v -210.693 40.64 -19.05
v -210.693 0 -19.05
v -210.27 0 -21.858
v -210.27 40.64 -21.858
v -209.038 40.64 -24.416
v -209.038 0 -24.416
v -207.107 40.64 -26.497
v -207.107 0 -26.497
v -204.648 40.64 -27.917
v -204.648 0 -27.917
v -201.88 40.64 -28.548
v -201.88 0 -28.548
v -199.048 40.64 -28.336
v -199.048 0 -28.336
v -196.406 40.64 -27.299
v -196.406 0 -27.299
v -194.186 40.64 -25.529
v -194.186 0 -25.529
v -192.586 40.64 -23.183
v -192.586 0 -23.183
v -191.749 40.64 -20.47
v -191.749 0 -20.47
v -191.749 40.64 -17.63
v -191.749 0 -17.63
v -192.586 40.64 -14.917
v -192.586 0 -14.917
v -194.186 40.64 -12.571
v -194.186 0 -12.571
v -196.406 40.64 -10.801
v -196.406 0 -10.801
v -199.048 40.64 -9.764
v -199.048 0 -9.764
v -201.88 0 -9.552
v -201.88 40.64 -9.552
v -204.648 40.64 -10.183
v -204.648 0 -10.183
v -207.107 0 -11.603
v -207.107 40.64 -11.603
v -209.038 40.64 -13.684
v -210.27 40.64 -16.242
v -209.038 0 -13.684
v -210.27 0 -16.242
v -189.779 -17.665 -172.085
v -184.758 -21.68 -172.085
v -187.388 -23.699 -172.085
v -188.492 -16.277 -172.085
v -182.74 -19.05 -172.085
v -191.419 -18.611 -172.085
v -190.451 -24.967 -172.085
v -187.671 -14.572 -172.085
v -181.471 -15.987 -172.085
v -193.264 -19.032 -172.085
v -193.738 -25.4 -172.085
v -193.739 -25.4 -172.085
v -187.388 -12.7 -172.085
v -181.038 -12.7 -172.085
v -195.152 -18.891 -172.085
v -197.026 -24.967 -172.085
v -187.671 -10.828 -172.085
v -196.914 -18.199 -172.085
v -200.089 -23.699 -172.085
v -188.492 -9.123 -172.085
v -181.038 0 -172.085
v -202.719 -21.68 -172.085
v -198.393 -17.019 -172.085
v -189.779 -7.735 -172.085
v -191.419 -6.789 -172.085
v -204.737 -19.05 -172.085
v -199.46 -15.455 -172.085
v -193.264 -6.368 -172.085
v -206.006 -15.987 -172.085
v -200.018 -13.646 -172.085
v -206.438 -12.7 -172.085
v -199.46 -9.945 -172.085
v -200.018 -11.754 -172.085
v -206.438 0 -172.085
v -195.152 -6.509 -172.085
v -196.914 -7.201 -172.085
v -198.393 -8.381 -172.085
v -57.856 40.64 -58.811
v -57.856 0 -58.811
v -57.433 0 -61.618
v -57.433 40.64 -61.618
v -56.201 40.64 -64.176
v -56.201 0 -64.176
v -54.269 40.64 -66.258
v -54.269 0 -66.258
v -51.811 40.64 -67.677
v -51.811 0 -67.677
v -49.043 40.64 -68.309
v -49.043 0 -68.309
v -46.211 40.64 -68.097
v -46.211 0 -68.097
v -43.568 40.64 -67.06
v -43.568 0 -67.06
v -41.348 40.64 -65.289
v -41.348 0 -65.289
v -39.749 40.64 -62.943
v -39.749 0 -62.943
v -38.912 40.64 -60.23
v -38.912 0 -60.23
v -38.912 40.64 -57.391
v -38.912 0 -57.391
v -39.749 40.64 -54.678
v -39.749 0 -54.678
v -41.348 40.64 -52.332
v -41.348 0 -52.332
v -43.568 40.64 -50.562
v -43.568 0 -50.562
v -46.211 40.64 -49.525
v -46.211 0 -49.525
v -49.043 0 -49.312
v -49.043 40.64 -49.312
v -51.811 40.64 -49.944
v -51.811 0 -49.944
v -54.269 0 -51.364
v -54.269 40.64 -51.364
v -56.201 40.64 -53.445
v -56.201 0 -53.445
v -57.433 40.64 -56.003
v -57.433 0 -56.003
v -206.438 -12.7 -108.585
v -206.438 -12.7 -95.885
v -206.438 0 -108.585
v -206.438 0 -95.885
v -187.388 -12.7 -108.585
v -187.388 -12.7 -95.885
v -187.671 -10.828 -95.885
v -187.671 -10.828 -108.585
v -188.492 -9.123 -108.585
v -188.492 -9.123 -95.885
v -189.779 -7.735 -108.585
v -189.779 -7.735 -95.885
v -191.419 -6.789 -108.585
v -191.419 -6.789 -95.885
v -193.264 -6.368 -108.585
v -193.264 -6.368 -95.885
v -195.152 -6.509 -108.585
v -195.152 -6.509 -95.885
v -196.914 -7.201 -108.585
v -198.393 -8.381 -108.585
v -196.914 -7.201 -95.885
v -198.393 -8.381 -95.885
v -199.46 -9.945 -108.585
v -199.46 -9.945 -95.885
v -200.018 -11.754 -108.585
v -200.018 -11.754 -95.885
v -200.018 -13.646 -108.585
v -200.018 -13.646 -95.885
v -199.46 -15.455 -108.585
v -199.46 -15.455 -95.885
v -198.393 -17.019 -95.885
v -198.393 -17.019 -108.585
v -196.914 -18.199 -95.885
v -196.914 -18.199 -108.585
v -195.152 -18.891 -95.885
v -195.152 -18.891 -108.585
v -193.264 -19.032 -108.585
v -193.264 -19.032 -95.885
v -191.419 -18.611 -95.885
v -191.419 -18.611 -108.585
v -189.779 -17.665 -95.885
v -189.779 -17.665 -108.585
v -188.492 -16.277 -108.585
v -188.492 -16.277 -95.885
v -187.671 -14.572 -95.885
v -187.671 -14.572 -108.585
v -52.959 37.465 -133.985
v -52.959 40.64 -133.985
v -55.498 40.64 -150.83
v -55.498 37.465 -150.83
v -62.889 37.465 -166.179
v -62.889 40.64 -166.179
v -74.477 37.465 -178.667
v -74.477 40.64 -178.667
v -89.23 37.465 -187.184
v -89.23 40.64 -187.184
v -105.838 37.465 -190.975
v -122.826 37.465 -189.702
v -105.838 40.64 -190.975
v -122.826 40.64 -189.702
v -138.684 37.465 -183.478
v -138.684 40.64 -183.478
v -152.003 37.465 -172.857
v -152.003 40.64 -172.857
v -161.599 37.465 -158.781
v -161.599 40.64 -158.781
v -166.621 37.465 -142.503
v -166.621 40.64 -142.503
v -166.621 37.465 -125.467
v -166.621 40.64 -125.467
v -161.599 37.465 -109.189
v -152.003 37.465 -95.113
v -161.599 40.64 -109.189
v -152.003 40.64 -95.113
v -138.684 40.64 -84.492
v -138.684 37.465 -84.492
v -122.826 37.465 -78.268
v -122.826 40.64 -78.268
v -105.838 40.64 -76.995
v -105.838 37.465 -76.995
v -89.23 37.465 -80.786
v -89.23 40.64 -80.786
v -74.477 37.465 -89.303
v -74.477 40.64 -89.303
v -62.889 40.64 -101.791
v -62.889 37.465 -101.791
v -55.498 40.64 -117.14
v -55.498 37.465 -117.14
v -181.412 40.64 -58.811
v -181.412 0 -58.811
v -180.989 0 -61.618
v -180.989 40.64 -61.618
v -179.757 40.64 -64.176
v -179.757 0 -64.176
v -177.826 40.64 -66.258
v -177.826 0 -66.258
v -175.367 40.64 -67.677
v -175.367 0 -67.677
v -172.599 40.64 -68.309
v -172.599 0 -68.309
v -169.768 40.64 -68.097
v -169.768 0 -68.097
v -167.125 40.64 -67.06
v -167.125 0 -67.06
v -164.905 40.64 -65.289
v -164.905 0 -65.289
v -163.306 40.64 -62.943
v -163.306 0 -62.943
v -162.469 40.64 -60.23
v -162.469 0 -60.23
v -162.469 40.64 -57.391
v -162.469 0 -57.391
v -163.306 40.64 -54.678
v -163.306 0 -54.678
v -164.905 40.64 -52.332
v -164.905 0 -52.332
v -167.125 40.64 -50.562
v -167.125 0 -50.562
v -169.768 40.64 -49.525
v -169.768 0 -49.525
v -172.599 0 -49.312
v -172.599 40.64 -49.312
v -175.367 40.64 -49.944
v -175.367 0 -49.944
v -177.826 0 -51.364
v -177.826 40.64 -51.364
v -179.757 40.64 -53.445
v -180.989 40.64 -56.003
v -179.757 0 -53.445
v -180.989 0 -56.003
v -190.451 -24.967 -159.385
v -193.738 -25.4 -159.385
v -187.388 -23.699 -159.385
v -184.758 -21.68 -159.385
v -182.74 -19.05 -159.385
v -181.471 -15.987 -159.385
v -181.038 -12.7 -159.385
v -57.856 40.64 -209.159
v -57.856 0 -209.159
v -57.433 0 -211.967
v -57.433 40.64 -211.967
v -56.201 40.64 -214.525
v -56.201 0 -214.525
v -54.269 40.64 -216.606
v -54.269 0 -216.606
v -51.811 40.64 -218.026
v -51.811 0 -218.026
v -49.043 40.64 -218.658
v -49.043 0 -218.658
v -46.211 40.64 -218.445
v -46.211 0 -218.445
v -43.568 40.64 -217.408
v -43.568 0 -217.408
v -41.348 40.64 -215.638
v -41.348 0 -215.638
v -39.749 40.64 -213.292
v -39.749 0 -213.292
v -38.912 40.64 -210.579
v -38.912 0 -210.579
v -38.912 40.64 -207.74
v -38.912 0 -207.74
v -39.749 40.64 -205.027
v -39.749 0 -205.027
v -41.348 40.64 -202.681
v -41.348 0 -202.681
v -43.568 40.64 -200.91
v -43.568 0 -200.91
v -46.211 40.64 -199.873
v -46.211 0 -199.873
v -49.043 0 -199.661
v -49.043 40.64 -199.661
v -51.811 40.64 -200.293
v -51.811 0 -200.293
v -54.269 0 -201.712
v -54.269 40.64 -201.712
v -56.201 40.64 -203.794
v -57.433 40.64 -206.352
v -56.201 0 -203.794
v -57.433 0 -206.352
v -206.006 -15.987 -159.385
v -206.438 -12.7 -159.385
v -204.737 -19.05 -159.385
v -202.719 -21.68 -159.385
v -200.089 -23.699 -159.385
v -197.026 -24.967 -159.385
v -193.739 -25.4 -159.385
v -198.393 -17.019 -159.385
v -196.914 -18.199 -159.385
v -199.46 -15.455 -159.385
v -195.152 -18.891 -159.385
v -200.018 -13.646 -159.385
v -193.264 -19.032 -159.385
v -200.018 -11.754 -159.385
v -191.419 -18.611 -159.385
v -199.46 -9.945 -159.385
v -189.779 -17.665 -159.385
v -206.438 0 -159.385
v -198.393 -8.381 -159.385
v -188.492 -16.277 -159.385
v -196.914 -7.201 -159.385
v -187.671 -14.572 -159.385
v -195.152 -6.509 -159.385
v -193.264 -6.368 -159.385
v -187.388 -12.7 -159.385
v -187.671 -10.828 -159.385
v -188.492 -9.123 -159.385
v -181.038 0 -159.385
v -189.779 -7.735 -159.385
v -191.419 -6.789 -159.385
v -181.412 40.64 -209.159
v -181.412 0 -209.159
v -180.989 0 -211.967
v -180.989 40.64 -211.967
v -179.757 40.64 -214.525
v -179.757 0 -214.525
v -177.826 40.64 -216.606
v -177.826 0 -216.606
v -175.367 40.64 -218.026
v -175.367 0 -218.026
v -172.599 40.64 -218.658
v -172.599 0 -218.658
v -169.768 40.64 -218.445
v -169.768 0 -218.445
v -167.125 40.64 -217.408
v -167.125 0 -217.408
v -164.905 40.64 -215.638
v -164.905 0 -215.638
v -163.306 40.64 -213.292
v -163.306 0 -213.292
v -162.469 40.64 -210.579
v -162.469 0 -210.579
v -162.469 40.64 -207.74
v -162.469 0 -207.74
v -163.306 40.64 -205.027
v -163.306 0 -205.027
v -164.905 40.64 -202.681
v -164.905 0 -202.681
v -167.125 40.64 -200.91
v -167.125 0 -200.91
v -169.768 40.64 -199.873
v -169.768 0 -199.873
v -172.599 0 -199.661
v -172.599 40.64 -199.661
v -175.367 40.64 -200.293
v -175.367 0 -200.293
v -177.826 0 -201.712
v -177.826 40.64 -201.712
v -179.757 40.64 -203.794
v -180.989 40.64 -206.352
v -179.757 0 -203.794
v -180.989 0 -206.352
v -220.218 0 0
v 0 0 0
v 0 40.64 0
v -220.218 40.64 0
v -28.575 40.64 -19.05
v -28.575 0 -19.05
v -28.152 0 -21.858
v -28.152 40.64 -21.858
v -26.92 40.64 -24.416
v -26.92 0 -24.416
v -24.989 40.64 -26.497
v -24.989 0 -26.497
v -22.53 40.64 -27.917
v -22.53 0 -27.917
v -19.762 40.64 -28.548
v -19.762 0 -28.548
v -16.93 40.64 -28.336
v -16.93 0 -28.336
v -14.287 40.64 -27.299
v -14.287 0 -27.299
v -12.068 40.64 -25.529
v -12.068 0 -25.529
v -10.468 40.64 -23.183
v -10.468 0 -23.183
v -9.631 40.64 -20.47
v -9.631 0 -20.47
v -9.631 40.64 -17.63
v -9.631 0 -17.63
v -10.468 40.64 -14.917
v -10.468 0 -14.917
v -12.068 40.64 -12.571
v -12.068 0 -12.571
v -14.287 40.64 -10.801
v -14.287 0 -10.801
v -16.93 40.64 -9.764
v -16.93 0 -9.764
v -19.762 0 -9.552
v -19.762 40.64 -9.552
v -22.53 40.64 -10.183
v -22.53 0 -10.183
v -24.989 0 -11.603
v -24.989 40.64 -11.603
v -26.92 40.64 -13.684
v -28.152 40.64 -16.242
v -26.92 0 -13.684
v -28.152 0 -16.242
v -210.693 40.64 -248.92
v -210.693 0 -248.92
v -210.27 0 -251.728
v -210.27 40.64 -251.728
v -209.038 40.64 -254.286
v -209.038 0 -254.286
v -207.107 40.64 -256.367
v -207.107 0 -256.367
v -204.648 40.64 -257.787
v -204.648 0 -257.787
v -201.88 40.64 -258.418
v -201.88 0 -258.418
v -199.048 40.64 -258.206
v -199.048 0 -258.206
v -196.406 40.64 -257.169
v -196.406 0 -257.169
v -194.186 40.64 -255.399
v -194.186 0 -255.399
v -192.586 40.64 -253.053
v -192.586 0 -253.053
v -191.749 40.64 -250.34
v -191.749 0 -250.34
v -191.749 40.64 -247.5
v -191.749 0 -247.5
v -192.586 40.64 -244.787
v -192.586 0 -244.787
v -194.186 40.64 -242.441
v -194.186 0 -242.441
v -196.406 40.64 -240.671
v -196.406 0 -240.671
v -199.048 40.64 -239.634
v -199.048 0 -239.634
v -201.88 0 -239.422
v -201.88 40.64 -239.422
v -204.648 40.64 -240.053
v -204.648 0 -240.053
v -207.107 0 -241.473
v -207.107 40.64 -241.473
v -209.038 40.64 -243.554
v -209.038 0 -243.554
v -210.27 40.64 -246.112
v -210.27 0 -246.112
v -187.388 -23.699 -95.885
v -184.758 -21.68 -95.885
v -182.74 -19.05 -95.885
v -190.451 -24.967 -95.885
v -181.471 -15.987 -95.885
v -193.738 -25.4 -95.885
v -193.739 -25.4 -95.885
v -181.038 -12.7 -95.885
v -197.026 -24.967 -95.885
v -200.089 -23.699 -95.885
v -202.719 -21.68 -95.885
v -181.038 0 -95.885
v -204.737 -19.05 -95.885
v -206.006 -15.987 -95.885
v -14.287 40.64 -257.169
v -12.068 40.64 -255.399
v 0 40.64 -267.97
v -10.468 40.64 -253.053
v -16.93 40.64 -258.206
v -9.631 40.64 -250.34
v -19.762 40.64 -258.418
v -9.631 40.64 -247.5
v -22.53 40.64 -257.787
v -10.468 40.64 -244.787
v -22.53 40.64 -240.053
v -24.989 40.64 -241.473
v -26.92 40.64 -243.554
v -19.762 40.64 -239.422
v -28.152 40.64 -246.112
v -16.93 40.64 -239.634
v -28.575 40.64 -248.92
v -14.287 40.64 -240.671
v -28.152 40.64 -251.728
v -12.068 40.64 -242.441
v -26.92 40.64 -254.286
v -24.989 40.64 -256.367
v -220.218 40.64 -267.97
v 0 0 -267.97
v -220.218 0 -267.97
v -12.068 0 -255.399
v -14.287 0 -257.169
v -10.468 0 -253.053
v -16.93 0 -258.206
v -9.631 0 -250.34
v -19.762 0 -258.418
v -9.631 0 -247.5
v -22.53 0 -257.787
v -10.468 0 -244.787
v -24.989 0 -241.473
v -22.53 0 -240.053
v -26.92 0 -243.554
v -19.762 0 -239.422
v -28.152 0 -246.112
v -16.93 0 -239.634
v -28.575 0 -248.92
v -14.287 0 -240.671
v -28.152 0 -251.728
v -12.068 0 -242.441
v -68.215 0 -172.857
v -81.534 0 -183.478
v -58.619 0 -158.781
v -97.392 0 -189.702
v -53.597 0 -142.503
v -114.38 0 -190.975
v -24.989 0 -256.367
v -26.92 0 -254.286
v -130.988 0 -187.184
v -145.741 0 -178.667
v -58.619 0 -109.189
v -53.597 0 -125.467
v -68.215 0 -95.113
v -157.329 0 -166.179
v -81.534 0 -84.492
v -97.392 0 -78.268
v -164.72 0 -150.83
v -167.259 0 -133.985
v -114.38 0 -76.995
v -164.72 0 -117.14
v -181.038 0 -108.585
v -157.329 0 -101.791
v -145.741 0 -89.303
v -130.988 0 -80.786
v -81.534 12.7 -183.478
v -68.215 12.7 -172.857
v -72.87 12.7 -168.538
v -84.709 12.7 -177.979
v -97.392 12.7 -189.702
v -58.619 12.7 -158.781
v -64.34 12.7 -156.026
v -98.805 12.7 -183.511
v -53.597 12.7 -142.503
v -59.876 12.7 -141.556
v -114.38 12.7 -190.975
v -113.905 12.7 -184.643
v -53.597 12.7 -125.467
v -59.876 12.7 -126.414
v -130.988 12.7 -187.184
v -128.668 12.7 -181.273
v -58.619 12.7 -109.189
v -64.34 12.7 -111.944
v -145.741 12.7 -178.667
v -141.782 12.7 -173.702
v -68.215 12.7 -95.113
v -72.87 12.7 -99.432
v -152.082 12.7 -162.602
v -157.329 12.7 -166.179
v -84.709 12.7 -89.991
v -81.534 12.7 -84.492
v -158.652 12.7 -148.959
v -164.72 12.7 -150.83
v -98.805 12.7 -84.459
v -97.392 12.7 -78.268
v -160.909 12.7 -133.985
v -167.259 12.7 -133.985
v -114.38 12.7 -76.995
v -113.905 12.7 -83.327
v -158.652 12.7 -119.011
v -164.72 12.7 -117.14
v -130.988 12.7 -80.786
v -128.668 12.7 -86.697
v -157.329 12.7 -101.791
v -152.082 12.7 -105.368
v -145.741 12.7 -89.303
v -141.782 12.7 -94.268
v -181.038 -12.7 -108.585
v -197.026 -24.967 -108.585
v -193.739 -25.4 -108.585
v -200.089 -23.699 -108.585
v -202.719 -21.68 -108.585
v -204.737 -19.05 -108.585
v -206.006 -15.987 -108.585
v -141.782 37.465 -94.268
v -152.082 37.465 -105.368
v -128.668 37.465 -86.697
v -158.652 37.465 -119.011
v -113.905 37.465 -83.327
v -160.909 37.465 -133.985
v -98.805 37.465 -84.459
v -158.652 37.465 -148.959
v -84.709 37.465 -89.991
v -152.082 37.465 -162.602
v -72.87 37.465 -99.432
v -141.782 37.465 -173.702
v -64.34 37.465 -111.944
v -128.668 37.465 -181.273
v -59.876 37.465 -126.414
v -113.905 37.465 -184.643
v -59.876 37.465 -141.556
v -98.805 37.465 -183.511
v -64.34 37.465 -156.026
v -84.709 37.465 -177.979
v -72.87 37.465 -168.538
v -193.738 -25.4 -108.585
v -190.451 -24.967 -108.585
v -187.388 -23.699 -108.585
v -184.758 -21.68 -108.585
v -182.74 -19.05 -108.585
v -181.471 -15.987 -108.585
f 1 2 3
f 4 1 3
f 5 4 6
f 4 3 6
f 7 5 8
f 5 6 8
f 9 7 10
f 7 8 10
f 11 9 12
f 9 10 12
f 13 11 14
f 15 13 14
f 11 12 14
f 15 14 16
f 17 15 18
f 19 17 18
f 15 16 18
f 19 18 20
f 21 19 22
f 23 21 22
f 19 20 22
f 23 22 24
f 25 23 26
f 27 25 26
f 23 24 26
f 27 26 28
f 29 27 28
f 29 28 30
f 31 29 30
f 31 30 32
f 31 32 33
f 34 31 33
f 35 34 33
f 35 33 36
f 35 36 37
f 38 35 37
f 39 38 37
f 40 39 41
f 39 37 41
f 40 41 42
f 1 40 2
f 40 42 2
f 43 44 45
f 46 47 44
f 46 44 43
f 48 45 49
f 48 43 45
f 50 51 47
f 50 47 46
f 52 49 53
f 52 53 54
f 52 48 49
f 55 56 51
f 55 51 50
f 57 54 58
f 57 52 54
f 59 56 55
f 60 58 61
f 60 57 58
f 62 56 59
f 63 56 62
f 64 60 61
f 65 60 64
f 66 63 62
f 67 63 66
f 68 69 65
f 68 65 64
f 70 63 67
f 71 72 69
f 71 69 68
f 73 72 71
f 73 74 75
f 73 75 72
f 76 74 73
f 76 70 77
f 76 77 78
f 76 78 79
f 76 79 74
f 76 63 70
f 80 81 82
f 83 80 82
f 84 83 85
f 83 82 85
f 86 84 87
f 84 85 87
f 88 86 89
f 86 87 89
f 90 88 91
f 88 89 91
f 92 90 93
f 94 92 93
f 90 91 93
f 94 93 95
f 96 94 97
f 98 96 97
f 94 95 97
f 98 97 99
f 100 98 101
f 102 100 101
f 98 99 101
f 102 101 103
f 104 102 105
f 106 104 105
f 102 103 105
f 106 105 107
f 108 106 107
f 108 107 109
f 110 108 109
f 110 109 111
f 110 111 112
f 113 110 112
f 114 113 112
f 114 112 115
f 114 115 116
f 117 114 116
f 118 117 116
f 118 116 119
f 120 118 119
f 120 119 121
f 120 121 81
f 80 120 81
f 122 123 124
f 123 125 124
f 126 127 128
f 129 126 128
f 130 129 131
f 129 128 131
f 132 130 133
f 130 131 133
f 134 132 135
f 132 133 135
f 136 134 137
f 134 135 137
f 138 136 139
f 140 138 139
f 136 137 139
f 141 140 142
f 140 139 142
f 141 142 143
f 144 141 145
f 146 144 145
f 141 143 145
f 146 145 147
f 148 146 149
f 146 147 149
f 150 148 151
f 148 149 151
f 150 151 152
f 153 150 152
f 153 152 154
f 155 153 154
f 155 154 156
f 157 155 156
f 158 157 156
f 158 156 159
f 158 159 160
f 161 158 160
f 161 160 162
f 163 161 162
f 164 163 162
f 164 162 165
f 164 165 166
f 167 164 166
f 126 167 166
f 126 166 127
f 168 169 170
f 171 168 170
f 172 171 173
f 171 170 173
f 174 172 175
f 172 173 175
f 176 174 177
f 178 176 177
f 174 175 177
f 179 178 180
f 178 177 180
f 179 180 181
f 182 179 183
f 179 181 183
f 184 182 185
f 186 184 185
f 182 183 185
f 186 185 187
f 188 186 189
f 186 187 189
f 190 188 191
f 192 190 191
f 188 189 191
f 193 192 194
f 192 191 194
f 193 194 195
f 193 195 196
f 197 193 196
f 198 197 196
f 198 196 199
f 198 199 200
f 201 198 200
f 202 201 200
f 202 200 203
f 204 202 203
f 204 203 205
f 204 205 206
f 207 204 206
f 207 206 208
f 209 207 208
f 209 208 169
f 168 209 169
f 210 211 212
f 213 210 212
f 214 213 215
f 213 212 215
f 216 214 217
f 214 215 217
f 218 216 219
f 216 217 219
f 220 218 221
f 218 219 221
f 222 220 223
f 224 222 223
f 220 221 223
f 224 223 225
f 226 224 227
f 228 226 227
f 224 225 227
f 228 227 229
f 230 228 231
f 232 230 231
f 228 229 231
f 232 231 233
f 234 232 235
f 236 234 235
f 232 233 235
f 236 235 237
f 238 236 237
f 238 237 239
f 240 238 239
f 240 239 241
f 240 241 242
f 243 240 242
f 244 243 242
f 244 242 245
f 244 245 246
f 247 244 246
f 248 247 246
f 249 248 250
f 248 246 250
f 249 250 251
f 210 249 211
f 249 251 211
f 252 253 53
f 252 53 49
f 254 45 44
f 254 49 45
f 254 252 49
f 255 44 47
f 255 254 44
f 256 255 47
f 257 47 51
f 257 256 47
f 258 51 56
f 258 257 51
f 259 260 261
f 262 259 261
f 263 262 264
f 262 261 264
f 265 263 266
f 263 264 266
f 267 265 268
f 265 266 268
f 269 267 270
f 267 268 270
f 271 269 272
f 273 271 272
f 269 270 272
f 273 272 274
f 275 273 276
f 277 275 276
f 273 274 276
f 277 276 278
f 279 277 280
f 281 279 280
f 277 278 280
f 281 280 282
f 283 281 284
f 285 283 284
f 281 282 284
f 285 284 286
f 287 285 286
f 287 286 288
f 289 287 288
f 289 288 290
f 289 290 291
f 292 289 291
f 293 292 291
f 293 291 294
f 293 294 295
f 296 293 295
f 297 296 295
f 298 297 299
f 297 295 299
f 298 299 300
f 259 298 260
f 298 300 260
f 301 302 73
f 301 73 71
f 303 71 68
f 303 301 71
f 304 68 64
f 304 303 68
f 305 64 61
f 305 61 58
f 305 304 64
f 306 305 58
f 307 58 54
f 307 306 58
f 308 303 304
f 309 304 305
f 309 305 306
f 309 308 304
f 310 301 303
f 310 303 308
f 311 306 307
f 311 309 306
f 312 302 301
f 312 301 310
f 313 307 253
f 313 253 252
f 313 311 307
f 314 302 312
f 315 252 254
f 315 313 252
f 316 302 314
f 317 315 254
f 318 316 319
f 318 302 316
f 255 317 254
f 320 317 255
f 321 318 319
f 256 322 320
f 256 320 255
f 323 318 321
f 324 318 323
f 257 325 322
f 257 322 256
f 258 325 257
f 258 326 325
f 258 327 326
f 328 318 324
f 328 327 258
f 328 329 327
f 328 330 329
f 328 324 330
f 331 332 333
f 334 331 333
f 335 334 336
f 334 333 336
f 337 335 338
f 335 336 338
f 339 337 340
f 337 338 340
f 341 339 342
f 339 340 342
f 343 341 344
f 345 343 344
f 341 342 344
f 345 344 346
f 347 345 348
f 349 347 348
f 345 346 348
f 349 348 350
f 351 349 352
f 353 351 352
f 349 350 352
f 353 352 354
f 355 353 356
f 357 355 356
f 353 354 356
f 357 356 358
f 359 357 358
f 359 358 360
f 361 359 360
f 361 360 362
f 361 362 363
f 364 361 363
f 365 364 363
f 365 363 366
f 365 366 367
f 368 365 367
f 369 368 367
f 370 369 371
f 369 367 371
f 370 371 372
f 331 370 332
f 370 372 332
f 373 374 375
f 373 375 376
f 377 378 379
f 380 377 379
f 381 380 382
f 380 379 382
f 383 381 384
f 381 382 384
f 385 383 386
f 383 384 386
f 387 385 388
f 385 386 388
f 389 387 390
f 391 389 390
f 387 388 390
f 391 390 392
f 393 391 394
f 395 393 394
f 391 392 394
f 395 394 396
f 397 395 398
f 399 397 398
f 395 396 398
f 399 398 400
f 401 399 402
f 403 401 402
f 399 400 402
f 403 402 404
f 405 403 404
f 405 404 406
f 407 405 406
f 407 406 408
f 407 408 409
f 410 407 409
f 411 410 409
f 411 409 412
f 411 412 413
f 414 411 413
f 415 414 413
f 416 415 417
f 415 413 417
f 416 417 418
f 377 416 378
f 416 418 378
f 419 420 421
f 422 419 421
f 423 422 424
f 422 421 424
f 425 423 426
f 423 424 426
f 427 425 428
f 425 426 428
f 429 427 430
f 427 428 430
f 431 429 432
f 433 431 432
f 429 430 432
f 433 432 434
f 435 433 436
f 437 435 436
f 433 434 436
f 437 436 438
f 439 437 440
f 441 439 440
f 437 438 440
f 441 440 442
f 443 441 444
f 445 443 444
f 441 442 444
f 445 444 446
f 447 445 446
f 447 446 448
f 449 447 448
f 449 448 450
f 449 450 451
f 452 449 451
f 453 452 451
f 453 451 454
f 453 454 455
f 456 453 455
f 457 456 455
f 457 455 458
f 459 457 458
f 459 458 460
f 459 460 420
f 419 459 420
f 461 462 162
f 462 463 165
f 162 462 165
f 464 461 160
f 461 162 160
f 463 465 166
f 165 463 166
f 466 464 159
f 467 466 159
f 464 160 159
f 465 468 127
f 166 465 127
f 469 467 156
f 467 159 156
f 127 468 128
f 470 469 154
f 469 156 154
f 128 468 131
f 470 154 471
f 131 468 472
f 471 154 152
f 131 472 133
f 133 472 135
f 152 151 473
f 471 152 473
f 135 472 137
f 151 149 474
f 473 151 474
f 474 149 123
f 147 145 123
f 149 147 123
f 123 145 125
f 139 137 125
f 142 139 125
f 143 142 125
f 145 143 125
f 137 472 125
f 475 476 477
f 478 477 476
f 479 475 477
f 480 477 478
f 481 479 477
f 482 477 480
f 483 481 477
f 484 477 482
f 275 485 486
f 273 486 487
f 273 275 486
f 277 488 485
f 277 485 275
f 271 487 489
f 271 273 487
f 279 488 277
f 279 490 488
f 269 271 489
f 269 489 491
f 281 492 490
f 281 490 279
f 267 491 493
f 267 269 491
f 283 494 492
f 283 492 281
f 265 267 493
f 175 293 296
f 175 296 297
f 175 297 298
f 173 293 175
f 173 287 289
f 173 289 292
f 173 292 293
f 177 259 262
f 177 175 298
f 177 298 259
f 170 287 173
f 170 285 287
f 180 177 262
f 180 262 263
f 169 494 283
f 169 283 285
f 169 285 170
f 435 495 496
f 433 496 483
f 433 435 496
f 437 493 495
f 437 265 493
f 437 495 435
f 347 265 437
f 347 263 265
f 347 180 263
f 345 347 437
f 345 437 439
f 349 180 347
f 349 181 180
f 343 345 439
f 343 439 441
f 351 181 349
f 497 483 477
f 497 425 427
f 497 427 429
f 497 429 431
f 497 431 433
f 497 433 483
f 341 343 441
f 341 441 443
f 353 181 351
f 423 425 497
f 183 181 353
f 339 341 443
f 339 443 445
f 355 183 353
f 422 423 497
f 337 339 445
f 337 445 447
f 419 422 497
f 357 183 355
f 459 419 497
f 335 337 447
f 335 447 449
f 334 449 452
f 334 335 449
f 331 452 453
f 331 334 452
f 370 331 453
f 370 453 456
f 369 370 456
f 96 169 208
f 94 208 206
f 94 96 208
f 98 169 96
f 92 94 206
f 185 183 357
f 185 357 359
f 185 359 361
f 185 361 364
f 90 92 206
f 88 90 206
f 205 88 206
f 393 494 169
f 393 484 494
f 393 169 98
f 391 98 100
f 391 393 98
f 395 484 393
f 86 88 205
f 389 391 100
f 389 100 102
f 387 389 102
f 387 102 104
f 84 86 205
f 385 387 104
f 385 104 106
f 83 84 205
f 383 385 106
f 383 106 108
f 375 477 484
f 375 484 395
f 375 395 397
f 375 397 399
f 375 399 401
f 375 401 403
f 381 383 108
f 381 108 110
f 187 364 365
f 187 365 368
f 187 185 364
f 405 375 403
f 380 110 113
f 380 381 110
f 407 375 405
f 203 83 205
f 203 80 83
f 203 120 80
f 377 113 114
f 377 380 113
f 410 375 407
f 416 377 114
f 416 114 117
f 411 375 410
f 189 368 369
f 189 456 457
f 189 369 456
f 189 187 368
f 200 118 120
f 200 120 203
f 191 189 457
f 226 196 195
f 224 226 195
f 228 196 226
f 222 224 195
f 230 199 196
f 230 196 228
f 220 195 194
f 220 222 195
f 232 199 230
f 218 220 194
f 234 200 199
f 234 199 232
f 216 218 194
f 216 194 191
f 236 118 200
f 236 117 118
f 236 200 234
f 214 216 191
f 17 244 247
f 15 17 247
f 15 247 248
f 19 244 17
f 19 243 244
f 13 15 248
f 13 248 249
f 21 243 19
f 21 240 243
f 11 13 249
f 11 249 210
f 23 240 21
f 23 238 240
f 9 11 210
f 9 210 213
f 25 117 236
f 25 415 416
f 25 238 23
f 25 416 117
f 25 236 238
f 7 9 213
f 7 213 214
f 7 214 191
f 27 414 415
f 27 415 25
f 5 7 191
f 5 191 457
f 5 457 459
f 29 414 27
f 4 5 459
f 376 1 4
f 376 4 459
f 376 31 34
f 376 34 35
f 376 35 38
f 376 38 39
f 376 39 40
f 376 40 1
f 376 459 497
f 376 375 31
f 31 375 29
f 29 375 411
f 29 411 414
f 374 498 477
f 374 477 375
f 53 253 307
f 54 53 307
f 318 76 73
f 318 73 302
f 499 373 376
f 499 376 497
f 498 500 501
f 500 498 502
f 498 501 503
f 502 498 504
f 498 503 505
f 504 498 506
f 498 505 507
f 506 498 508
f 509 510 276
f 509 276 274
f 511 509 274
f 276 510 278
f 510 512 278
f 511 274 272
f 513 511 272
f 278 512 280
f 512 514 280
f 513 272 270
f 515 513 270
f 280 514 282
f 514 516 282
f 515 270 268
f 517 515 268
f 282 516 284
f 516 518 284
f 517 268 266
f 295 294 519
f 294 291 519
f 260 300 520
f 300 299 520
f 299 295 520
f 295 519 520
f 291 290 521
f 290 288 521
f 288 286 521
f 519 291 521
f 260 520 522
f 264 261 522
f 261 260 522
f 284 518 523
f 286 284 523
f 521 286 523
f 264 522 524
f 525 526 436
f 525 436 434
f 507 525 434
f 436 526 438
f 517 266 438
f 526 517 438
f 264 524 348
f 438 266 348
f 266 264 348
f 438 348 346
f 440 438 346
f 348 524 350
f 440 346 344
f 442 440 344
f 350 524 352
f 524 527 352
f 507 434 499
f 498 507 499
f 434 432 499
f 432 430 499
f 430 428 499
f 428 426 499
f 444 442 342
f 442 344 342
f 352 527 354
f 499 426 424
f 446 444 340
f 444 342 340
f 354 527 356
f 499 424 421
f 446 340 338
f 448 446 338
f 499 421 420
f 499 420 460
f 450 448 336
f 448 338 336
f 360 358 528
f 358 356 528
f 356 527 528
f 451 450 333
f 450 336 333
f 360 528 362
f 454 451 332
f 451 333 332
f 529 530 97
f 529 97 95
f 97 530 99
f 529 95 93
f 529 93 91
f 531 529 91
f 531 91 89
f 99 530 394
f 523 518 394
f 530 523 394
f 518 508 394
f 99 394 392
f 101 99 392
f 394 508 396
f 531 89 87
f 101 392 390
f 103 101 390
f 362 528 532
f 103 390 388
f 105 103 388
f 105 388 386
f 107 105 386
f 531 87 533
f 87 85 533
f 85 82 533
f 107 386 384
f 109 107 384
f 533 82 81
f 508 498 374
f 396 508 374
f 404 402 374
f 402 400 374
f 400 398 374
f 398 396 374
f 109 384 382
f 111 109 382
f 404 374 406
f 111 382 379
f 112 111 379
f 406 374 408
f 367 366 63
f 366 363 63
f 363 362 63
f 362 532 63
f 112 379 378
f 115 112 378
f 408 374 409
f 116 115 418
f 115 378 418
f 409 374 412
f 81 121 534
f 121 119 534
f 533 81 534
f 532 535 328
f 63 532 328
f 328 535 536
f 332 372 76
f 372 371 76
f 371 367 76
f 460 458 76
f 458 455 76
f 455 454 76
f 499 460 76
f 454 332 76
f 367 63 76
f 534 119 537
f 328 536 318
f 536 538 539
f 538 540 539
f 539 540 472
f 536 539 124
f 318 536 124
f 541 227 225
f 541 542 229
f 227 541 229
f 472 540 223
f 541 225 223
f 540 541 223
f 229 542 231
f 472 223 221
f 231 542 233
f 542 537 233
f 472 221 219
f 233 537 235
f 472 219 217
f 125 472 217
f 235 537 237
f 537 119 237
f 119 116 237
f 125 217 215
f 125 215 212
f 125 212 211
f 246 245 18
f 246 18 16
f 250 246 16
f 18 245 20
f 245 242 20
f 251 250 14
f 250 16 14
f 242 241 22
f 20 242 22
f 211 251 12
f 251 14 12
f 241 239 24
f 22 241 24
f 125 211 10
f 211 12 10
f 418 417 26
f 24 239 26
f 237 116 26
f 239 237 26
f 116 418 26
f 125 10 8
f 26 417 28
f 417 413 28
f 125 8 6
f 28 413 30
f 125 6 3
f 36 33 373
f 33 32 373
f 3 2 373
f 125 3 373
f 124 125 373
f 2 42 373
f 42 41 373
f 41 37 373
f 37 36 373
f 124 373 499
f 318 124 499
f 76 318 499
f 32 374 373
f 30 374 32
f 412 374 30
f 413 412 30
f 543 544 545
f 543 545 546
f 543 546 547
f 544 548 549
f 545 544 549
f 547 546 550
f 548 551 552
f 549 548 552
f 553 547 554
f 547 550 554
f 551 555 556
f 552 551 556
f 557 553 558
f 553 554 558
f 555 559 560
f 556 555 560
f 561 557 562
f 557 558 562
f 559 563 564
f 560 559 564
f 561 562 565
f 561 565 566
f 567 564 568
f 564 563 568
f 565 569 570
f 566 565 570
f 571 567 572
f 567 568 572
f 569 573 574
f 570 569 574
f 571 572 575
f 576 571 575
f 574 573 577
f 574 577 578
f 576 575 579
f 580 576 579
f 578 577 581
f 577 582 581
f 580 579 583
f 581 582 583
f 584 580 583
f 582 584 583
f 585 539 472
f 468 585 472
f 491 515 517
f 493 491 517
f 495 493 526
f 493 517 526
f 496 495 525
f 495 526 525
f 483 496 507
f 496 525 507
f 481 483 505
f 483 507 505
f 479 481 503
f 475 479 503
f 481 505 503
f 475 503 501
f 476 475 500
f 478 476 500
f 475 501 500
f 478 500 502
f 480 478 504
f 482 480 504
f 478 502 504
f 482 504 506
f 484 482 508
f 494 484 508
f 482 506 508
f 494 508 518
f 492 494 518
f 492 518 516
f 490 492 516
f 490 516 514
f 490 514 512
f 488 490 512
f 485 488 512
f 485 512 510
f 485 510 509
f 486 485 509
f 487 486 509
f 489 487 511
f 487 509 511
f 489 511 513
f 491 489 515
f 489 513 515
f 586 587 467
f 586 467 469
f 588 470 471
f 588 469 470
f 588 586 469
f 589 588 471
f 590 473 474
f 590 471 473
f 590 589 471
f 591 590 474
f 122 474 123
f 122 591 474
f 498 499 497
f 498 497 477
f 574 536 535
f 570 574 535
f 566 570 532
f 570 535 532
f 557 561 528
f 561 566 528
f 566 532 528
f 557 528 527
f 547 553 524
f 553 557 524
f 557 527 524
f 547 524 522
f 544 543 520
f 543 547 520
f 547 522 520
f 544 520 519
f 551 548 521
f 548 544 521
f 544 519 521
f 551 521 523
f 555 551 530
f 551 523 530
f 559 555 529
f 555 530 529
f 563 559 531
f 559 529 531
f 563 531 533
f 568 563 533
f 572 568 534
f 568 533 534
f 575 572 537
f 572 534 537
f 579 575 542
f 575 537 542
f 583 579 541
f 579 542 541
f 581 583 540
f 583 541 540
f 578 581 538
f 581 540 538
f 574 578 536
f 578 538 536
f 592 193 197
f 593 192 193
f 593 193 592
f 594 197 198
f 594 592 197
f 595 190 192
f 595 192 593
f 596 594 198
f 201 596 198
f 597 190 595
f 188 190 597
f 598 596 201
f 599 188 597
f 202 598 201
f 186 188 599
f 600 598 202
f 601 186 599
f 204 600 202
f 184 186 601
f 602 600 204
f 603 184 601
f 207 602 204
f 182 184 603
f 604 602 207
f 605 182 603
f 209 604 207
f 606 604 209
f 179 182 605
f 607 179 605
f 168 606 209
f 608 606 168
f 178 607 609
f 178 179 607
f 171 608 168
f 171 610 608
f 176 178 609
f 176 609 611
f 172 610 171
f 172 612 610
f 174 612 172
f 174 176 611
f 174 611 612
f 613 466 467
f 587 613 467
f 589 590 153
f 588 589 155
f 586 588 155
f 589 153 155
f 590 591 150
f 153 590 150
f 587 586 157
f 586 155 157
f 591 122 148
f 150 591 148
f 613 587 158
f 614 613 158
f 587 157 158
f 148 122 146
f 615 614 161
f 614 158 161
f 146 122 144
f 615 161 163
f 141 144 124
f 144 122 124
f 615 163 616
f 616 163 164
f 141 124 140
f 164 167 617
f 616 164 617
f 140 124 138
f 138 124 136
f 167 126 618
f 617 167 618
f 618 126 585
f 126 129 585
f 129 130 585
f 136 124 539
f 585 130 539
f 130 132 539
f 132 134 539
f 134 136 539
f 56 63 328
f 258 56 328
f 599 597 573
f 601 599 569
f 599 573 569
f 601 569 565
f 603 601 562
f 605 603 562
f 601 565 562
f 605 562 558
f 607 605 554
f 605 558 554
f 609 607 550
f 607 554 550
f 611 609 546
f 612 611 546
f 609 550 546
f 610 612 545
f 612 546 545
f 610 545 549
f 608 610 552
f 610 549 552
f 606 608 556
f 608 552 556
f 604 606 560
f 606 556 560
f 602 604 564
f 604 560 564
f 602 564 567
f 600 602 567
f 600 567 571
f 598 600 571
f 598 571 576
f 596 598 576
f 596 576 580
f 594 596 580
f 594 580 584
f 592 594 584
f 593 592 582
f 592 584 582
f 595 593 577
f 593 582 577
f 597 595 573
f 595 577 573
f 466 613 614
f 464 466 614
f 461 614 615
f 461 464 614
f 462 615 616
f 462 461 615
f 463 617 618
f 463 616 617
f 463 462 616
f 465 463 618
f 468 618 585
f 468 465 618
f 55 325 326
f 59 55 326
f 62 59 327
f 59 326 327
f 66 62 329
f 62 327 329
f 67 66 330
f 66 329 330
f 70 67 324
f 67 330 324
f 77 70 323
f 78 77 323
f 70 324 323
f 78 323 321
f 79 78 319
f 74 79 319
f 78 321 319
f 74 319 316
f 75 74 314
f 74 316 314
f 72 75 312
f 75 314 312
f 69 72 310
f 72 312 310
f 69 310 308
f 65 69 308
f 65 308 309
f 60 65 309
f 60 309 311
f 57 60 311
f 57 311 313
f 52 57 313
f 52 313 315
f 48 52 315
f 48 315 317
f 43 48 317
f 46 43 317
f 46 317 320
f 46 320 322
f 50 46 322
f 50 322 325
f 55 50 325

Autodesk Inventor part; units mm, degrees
ref_plane "YZ Plane" through (0, 0, 0) normal (1, 0, 0) x (0, 1, 0)
ref_plane "XZ Plane" through (0, 0, 0) normal (0, 1, 0) x (-1, 0, 0)
ref_plane "XY Plane" through (0, 0, 0) normal (0, 0, 1) x (1, 0, 0)
sketch "Sketch1" plane through (0, 0, 0) normal (0, 1, 0) x (-1, 0, 0)
  line L0 (0, 0) -> (220.218, 0)
  line L1 (220.218, 0) -> (220.218, -267.97)
  line L2 (220.218, -267.97) -> (0, -267.97)
  line L3 (0, -267.97) -> (0, 0)
  circle A0 centre (110.109, -133.985) radius 57.15
  circle A1 centre (110.109, -133.985) radius 50.8
  line L4 (220.218, 0) -> (220.218, -25.4)
  circle A2 centre (201.168, -248.92) radius 9.525
  circle A3 centre (201.168, -19.05) radius 9.525
  circle A4 centre (19.05, -248.92) radius 9.525
  circle A5 centre (19.05, -19.05) radius 9.525
  line L5 (181.0385, -172.085) -> (193.7385, -172.085)
  line L6 (193.7385, -172.085) -> (206.4385, -172.085)
  line L7 (181.0385, -172.085) -> (206.4385, -172.085)
  line L8 (206.4385, -172.085) -> (206.4385, -159.385)
  line L9 (206.4385, -159.385) -> (181.0385, -159.385)
  line L10 (181.0385, -95.885) -> (193.7385, -95.885)
  line L11 (193.7385, -95.885) -> (206.4385, -95.885)
  line L12 (181.0385, -95.885) -> (206.4385, -95.885)
  line L13 (206.4385, -95.885) -> (206.4385, -108.585)
  line L14 (206.4385, -108.585) -> (181.0385, -108.585)
  line L15 (181.0385, -172.085) -> (181.0385, -159.385)
  line L16 (181.0385, -108.585) -> (181.0385, -95.885)
  circle A6 centre (171.8873, -209.1593) radius 34.925
  circle A7 centre (48.3307, -209.1593) radius 34.925
  circle A8 centre (171.8873, -58.8107) radius 34.925
  circle A9 centre (48.3307, -58.8107) radius 34.925
  circle A10 centre (171.8873, -58.8107) radius 9.525
  circle A11 centre (171.8873, -209.1593) radius 9.525
  circle A12 centre (48.3307, -209.1593) radius 9.525
  circle A13 centre (48.3307, -58.8107) radius 9.525
  dimension "d0" = 220.218
  dimension "d1" = 267.97
  dimension "d41" = 12.7
  dimension "d44" = 12.7
  dimension "d52" = 69.85
  dimension "d53" = 19.05
  dimension "d54" = 19.05
  dimension "d57" = 19.05
  dimension "d58" = 19.05
extrude "Extrusion3" add sketch "Sketch1" along normal blind 40.64 contours L0 L1 L2 L3 | A0 | A1 | A2 | A3 | A4 | A5 | L15 L9 L8 L6 L5 | L10 L11 L13 L14 L16 | A6 | A7 | A8 | A9 | A10 | A11 | A12 | A13
extrude "Extrusion4" cut sketch "Sketch1" along normal blind 40.64 contours A1
extrude "Extrusion5" cut sketch "Sketch1" along normal blind 12.7 contours A0 | A1
sketch "Sketch3" plane through (0, 40.64, 0) normal (0, 1, 0) x (1, 0, 0)
  line L0 (0, 267.97) -> (-220.218, 267.97) projected
  line L1 (-220.218, 0) -> (0, 0) projected
  circle A0 centre (-110.109, 133.985) radius 57.15
  dimension "d21" = 114.3
extrude "Extrusion6" cut sketch "Sketch3" against normal blind 3.175
extrude "Extrusion8" cut sketch "Sketch1" along normal blind 87.3125 contours A2 | A3 | A4 | A5
extrude "Extrusion9" add sketch "Sketch1" against normal blind 25.4 contours L15 L9 L8 L6 L5 | L10 L11 L13 L14 L16
fillet "Fillet1" radius 12.7 4 edges at (-181.0385, -25.4, -102.235) (-181.0385, -25.4, -165.735) (-206.4385, -25.4, -165.735) (-206.4385, -25.4, -102.235)
sketch "Sketch4" plane through (-206.4385, 0, -95.885) normal (0, 0, 1) x (1, 0, 0)
  arc A0 (0, -12.7) -> (25.4, -12.7) centre (12.7, -12.7) ccw projected
  circle A1 centre (12.7, -12.7) radius 6.35
  point P0 (206.4385, 0)
  dimension "d48" = 12.7
extrude "Extrusion10" cut sketch "Sketch4" along normal mid plane 436.5625
extrude "Extrusion11" cut sketch "Sketch1" along normal blind 125.4125 contours A10 | A11 | A12 | A13
properties part number "Wash_Base_Bottom"
